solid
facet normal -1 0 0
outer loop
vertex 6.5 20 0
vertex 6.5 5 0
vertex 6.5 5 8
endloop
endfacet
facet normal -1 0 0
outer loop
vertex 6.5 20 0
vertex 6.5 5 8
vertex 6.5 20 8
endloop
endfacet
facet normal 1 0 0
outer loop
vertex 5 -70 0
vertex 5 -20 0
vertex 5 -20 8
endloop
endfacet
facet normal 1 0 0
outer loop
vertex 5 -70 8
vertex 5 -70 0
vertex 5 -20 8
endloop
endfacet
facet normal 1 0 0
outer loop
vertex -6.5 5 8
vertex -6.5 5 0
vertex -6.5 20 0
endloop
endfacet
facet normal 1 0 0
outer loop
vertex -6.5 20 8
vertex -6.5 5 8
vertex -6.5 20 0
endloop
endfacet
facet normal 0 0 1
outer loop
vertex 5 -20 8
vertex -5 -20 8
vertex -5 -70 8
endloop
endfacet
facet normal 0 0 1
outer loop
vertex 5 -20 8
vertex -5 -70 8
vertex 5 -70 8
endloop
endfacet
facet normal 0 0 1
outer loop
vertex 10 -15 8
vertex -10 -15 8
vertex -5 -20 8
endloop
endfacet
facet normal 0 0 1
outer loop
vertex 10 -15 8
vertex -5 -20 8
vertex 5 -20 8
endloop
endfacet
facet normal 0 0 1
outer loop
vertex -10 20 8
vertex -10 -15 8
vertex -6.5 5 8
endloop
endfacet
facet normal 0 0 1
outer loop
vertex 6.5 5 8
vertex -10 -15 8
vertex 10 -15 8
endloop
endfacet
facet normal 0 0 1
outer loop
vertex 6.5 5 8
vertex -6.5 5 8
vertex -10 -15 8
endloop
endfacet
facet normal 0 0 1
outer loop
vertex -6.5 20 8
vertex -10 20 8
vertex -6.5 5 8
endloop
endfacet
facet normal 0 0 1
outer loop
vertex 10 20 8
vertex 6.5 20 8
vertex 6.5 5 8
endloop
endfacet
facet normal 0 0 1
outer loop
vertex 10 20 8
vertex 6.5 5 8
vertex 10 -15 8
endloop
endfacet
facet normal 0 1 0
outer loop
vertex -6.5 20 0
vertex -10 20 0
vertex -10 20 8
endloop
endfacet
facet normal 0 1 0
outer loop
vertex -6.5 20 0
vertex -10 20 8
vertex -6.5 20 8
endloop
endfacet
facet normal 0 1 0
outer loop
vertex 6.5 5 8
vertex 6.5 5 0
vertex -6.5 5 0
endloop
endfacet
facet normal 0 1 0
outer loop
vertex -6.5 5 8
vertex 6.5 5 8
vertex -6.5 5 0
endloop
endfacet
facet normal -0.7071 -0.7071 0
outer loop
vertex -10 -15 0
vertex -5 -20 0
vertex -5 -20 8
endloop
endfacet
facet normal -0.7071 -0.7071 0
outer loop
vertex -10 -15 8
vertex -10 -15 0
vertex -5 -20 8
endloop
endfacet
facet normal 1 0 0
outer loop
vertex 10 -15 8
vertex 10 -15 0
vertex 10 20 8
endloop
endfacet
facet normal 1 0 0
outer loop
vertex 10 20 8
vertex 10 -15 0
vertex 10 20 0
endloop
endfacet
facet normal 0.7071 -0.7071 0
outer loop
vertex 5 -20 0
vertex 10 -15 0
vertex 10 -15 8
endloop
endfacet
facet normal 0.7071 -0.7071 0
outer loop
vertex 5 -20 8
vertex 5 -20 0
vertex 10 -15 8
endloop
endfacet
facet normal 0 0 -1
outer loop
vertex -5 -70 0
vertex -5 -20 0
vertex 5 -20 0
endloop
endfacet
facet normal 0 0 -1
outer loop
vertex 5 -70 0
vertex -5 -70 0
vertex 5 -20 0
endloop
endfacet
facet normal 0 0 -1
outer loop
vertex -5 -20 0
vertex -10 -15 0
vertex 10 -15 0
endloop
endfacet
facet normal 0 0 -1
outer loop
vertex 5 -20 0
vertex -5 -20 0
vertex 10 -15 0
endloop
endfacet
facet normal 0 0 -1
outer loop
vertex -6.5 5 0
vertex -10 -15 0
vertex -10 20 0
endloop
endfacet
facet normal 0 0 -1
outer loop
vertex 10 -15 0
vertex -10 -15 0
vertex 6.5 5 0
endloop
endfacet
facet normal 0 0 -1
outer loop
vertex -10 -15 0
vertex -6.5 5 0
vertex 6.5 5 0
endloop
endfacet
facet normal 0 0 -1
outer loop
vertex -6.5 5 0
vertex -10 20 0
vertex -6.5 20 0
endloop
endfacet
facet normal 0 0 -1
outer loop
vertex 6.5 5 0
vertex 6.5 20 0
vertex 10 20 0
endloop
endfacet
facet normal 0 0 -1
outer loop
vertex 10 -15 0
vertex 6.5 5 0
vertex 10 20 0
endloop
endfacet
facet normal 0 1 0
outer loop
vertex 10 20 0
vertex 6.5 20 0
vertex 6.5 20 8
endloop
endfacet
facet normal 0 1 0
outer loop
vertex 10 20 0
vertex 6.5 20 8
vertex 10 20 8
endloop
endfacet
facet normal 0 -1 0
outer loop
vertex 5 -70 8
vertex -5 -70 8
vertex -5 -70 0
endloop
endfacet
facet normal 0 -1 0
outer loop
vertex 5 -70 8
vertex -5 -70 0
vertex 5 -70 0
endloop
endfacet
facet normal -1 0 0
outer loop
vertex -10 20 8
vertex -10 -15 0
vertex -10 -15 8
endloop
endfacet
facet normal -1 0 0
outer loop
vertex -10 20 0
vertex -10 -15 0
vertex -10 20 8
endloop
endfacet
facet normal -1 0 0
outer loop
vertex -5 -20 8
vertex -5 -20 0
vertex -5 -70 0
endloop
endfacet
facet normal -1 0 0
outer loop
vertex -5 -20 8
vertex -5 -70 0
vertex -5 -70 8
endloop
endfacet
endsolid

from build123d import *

# Parameters (mm, degrees)
CROQUIS1_W              = 20
CROQUIS1_H              = 40
SALIENTE_EXTRUIR1_DEPTH = 8
CROQUIS2_W              = 13
CROQUIS2_H              = 15
CORTAR_EXTRUIR1_DEPTH   = 8
CHAFL_N3_SIZE           = 5
CHAFL_N4_SIZE           = 5
CROQUIS4_W              = 10
CROQUIS4_H              = 8
SALIENTE_EXTRUIR2_DEPTH = 50


with BuildPart() as part:
    # Croquis1 → Saliente-Extruir1 (new body)
    with BuildSketch(Plane.XY):
        Rectangle(CROQUIS1_W, CROQUIS1_H)
    extrude(amount=SALIENTE_EXTRUIR1_DEPTH)

    # Croquis2 → Cortar-Extruir1 (cut)
    with BuildSketch(Plane(origin=(0, 0, 0), x_dir=(-1, 0, 0), z_dir=(0, 0, -1))):
        with Locations((0, 12.5)):
            Rectangle(CROQUIS2_W, CROQUIS2_H)
    extrude(amount=-CORTAR_EXTRUIR1_DEPTH, mode=Mode.SUBTRACT)

    # Chaflán3
    chafl_n3_edges = [part.edges().sort_by_distance(p)[0] for p in [
        (-10, -20, 4),
    ]]
    chamfer(chafl_n3_edges, length=CHAFL_N3_SIZE)

    # Chaflán4
    chafl_n4_edges = [part.edges().sort_by_distance(p)[0] for p in [
        (10, -20, 4),
    ]]
    chamfer(chafl_n4_edges, length=CHAFL_N4_SIZE)

    # Croquis4 → Saliente-Extruir2 (add)
    with BuildSketch(Plane.XZ.offset(20)):
        with Locations((0, 4)):
            Rectangle(CROQUIS4_W, CROQUIS4_H)
    extrude(amount=SALIENTE_EXTRUIR2_DEPTH)


solid = part.part
